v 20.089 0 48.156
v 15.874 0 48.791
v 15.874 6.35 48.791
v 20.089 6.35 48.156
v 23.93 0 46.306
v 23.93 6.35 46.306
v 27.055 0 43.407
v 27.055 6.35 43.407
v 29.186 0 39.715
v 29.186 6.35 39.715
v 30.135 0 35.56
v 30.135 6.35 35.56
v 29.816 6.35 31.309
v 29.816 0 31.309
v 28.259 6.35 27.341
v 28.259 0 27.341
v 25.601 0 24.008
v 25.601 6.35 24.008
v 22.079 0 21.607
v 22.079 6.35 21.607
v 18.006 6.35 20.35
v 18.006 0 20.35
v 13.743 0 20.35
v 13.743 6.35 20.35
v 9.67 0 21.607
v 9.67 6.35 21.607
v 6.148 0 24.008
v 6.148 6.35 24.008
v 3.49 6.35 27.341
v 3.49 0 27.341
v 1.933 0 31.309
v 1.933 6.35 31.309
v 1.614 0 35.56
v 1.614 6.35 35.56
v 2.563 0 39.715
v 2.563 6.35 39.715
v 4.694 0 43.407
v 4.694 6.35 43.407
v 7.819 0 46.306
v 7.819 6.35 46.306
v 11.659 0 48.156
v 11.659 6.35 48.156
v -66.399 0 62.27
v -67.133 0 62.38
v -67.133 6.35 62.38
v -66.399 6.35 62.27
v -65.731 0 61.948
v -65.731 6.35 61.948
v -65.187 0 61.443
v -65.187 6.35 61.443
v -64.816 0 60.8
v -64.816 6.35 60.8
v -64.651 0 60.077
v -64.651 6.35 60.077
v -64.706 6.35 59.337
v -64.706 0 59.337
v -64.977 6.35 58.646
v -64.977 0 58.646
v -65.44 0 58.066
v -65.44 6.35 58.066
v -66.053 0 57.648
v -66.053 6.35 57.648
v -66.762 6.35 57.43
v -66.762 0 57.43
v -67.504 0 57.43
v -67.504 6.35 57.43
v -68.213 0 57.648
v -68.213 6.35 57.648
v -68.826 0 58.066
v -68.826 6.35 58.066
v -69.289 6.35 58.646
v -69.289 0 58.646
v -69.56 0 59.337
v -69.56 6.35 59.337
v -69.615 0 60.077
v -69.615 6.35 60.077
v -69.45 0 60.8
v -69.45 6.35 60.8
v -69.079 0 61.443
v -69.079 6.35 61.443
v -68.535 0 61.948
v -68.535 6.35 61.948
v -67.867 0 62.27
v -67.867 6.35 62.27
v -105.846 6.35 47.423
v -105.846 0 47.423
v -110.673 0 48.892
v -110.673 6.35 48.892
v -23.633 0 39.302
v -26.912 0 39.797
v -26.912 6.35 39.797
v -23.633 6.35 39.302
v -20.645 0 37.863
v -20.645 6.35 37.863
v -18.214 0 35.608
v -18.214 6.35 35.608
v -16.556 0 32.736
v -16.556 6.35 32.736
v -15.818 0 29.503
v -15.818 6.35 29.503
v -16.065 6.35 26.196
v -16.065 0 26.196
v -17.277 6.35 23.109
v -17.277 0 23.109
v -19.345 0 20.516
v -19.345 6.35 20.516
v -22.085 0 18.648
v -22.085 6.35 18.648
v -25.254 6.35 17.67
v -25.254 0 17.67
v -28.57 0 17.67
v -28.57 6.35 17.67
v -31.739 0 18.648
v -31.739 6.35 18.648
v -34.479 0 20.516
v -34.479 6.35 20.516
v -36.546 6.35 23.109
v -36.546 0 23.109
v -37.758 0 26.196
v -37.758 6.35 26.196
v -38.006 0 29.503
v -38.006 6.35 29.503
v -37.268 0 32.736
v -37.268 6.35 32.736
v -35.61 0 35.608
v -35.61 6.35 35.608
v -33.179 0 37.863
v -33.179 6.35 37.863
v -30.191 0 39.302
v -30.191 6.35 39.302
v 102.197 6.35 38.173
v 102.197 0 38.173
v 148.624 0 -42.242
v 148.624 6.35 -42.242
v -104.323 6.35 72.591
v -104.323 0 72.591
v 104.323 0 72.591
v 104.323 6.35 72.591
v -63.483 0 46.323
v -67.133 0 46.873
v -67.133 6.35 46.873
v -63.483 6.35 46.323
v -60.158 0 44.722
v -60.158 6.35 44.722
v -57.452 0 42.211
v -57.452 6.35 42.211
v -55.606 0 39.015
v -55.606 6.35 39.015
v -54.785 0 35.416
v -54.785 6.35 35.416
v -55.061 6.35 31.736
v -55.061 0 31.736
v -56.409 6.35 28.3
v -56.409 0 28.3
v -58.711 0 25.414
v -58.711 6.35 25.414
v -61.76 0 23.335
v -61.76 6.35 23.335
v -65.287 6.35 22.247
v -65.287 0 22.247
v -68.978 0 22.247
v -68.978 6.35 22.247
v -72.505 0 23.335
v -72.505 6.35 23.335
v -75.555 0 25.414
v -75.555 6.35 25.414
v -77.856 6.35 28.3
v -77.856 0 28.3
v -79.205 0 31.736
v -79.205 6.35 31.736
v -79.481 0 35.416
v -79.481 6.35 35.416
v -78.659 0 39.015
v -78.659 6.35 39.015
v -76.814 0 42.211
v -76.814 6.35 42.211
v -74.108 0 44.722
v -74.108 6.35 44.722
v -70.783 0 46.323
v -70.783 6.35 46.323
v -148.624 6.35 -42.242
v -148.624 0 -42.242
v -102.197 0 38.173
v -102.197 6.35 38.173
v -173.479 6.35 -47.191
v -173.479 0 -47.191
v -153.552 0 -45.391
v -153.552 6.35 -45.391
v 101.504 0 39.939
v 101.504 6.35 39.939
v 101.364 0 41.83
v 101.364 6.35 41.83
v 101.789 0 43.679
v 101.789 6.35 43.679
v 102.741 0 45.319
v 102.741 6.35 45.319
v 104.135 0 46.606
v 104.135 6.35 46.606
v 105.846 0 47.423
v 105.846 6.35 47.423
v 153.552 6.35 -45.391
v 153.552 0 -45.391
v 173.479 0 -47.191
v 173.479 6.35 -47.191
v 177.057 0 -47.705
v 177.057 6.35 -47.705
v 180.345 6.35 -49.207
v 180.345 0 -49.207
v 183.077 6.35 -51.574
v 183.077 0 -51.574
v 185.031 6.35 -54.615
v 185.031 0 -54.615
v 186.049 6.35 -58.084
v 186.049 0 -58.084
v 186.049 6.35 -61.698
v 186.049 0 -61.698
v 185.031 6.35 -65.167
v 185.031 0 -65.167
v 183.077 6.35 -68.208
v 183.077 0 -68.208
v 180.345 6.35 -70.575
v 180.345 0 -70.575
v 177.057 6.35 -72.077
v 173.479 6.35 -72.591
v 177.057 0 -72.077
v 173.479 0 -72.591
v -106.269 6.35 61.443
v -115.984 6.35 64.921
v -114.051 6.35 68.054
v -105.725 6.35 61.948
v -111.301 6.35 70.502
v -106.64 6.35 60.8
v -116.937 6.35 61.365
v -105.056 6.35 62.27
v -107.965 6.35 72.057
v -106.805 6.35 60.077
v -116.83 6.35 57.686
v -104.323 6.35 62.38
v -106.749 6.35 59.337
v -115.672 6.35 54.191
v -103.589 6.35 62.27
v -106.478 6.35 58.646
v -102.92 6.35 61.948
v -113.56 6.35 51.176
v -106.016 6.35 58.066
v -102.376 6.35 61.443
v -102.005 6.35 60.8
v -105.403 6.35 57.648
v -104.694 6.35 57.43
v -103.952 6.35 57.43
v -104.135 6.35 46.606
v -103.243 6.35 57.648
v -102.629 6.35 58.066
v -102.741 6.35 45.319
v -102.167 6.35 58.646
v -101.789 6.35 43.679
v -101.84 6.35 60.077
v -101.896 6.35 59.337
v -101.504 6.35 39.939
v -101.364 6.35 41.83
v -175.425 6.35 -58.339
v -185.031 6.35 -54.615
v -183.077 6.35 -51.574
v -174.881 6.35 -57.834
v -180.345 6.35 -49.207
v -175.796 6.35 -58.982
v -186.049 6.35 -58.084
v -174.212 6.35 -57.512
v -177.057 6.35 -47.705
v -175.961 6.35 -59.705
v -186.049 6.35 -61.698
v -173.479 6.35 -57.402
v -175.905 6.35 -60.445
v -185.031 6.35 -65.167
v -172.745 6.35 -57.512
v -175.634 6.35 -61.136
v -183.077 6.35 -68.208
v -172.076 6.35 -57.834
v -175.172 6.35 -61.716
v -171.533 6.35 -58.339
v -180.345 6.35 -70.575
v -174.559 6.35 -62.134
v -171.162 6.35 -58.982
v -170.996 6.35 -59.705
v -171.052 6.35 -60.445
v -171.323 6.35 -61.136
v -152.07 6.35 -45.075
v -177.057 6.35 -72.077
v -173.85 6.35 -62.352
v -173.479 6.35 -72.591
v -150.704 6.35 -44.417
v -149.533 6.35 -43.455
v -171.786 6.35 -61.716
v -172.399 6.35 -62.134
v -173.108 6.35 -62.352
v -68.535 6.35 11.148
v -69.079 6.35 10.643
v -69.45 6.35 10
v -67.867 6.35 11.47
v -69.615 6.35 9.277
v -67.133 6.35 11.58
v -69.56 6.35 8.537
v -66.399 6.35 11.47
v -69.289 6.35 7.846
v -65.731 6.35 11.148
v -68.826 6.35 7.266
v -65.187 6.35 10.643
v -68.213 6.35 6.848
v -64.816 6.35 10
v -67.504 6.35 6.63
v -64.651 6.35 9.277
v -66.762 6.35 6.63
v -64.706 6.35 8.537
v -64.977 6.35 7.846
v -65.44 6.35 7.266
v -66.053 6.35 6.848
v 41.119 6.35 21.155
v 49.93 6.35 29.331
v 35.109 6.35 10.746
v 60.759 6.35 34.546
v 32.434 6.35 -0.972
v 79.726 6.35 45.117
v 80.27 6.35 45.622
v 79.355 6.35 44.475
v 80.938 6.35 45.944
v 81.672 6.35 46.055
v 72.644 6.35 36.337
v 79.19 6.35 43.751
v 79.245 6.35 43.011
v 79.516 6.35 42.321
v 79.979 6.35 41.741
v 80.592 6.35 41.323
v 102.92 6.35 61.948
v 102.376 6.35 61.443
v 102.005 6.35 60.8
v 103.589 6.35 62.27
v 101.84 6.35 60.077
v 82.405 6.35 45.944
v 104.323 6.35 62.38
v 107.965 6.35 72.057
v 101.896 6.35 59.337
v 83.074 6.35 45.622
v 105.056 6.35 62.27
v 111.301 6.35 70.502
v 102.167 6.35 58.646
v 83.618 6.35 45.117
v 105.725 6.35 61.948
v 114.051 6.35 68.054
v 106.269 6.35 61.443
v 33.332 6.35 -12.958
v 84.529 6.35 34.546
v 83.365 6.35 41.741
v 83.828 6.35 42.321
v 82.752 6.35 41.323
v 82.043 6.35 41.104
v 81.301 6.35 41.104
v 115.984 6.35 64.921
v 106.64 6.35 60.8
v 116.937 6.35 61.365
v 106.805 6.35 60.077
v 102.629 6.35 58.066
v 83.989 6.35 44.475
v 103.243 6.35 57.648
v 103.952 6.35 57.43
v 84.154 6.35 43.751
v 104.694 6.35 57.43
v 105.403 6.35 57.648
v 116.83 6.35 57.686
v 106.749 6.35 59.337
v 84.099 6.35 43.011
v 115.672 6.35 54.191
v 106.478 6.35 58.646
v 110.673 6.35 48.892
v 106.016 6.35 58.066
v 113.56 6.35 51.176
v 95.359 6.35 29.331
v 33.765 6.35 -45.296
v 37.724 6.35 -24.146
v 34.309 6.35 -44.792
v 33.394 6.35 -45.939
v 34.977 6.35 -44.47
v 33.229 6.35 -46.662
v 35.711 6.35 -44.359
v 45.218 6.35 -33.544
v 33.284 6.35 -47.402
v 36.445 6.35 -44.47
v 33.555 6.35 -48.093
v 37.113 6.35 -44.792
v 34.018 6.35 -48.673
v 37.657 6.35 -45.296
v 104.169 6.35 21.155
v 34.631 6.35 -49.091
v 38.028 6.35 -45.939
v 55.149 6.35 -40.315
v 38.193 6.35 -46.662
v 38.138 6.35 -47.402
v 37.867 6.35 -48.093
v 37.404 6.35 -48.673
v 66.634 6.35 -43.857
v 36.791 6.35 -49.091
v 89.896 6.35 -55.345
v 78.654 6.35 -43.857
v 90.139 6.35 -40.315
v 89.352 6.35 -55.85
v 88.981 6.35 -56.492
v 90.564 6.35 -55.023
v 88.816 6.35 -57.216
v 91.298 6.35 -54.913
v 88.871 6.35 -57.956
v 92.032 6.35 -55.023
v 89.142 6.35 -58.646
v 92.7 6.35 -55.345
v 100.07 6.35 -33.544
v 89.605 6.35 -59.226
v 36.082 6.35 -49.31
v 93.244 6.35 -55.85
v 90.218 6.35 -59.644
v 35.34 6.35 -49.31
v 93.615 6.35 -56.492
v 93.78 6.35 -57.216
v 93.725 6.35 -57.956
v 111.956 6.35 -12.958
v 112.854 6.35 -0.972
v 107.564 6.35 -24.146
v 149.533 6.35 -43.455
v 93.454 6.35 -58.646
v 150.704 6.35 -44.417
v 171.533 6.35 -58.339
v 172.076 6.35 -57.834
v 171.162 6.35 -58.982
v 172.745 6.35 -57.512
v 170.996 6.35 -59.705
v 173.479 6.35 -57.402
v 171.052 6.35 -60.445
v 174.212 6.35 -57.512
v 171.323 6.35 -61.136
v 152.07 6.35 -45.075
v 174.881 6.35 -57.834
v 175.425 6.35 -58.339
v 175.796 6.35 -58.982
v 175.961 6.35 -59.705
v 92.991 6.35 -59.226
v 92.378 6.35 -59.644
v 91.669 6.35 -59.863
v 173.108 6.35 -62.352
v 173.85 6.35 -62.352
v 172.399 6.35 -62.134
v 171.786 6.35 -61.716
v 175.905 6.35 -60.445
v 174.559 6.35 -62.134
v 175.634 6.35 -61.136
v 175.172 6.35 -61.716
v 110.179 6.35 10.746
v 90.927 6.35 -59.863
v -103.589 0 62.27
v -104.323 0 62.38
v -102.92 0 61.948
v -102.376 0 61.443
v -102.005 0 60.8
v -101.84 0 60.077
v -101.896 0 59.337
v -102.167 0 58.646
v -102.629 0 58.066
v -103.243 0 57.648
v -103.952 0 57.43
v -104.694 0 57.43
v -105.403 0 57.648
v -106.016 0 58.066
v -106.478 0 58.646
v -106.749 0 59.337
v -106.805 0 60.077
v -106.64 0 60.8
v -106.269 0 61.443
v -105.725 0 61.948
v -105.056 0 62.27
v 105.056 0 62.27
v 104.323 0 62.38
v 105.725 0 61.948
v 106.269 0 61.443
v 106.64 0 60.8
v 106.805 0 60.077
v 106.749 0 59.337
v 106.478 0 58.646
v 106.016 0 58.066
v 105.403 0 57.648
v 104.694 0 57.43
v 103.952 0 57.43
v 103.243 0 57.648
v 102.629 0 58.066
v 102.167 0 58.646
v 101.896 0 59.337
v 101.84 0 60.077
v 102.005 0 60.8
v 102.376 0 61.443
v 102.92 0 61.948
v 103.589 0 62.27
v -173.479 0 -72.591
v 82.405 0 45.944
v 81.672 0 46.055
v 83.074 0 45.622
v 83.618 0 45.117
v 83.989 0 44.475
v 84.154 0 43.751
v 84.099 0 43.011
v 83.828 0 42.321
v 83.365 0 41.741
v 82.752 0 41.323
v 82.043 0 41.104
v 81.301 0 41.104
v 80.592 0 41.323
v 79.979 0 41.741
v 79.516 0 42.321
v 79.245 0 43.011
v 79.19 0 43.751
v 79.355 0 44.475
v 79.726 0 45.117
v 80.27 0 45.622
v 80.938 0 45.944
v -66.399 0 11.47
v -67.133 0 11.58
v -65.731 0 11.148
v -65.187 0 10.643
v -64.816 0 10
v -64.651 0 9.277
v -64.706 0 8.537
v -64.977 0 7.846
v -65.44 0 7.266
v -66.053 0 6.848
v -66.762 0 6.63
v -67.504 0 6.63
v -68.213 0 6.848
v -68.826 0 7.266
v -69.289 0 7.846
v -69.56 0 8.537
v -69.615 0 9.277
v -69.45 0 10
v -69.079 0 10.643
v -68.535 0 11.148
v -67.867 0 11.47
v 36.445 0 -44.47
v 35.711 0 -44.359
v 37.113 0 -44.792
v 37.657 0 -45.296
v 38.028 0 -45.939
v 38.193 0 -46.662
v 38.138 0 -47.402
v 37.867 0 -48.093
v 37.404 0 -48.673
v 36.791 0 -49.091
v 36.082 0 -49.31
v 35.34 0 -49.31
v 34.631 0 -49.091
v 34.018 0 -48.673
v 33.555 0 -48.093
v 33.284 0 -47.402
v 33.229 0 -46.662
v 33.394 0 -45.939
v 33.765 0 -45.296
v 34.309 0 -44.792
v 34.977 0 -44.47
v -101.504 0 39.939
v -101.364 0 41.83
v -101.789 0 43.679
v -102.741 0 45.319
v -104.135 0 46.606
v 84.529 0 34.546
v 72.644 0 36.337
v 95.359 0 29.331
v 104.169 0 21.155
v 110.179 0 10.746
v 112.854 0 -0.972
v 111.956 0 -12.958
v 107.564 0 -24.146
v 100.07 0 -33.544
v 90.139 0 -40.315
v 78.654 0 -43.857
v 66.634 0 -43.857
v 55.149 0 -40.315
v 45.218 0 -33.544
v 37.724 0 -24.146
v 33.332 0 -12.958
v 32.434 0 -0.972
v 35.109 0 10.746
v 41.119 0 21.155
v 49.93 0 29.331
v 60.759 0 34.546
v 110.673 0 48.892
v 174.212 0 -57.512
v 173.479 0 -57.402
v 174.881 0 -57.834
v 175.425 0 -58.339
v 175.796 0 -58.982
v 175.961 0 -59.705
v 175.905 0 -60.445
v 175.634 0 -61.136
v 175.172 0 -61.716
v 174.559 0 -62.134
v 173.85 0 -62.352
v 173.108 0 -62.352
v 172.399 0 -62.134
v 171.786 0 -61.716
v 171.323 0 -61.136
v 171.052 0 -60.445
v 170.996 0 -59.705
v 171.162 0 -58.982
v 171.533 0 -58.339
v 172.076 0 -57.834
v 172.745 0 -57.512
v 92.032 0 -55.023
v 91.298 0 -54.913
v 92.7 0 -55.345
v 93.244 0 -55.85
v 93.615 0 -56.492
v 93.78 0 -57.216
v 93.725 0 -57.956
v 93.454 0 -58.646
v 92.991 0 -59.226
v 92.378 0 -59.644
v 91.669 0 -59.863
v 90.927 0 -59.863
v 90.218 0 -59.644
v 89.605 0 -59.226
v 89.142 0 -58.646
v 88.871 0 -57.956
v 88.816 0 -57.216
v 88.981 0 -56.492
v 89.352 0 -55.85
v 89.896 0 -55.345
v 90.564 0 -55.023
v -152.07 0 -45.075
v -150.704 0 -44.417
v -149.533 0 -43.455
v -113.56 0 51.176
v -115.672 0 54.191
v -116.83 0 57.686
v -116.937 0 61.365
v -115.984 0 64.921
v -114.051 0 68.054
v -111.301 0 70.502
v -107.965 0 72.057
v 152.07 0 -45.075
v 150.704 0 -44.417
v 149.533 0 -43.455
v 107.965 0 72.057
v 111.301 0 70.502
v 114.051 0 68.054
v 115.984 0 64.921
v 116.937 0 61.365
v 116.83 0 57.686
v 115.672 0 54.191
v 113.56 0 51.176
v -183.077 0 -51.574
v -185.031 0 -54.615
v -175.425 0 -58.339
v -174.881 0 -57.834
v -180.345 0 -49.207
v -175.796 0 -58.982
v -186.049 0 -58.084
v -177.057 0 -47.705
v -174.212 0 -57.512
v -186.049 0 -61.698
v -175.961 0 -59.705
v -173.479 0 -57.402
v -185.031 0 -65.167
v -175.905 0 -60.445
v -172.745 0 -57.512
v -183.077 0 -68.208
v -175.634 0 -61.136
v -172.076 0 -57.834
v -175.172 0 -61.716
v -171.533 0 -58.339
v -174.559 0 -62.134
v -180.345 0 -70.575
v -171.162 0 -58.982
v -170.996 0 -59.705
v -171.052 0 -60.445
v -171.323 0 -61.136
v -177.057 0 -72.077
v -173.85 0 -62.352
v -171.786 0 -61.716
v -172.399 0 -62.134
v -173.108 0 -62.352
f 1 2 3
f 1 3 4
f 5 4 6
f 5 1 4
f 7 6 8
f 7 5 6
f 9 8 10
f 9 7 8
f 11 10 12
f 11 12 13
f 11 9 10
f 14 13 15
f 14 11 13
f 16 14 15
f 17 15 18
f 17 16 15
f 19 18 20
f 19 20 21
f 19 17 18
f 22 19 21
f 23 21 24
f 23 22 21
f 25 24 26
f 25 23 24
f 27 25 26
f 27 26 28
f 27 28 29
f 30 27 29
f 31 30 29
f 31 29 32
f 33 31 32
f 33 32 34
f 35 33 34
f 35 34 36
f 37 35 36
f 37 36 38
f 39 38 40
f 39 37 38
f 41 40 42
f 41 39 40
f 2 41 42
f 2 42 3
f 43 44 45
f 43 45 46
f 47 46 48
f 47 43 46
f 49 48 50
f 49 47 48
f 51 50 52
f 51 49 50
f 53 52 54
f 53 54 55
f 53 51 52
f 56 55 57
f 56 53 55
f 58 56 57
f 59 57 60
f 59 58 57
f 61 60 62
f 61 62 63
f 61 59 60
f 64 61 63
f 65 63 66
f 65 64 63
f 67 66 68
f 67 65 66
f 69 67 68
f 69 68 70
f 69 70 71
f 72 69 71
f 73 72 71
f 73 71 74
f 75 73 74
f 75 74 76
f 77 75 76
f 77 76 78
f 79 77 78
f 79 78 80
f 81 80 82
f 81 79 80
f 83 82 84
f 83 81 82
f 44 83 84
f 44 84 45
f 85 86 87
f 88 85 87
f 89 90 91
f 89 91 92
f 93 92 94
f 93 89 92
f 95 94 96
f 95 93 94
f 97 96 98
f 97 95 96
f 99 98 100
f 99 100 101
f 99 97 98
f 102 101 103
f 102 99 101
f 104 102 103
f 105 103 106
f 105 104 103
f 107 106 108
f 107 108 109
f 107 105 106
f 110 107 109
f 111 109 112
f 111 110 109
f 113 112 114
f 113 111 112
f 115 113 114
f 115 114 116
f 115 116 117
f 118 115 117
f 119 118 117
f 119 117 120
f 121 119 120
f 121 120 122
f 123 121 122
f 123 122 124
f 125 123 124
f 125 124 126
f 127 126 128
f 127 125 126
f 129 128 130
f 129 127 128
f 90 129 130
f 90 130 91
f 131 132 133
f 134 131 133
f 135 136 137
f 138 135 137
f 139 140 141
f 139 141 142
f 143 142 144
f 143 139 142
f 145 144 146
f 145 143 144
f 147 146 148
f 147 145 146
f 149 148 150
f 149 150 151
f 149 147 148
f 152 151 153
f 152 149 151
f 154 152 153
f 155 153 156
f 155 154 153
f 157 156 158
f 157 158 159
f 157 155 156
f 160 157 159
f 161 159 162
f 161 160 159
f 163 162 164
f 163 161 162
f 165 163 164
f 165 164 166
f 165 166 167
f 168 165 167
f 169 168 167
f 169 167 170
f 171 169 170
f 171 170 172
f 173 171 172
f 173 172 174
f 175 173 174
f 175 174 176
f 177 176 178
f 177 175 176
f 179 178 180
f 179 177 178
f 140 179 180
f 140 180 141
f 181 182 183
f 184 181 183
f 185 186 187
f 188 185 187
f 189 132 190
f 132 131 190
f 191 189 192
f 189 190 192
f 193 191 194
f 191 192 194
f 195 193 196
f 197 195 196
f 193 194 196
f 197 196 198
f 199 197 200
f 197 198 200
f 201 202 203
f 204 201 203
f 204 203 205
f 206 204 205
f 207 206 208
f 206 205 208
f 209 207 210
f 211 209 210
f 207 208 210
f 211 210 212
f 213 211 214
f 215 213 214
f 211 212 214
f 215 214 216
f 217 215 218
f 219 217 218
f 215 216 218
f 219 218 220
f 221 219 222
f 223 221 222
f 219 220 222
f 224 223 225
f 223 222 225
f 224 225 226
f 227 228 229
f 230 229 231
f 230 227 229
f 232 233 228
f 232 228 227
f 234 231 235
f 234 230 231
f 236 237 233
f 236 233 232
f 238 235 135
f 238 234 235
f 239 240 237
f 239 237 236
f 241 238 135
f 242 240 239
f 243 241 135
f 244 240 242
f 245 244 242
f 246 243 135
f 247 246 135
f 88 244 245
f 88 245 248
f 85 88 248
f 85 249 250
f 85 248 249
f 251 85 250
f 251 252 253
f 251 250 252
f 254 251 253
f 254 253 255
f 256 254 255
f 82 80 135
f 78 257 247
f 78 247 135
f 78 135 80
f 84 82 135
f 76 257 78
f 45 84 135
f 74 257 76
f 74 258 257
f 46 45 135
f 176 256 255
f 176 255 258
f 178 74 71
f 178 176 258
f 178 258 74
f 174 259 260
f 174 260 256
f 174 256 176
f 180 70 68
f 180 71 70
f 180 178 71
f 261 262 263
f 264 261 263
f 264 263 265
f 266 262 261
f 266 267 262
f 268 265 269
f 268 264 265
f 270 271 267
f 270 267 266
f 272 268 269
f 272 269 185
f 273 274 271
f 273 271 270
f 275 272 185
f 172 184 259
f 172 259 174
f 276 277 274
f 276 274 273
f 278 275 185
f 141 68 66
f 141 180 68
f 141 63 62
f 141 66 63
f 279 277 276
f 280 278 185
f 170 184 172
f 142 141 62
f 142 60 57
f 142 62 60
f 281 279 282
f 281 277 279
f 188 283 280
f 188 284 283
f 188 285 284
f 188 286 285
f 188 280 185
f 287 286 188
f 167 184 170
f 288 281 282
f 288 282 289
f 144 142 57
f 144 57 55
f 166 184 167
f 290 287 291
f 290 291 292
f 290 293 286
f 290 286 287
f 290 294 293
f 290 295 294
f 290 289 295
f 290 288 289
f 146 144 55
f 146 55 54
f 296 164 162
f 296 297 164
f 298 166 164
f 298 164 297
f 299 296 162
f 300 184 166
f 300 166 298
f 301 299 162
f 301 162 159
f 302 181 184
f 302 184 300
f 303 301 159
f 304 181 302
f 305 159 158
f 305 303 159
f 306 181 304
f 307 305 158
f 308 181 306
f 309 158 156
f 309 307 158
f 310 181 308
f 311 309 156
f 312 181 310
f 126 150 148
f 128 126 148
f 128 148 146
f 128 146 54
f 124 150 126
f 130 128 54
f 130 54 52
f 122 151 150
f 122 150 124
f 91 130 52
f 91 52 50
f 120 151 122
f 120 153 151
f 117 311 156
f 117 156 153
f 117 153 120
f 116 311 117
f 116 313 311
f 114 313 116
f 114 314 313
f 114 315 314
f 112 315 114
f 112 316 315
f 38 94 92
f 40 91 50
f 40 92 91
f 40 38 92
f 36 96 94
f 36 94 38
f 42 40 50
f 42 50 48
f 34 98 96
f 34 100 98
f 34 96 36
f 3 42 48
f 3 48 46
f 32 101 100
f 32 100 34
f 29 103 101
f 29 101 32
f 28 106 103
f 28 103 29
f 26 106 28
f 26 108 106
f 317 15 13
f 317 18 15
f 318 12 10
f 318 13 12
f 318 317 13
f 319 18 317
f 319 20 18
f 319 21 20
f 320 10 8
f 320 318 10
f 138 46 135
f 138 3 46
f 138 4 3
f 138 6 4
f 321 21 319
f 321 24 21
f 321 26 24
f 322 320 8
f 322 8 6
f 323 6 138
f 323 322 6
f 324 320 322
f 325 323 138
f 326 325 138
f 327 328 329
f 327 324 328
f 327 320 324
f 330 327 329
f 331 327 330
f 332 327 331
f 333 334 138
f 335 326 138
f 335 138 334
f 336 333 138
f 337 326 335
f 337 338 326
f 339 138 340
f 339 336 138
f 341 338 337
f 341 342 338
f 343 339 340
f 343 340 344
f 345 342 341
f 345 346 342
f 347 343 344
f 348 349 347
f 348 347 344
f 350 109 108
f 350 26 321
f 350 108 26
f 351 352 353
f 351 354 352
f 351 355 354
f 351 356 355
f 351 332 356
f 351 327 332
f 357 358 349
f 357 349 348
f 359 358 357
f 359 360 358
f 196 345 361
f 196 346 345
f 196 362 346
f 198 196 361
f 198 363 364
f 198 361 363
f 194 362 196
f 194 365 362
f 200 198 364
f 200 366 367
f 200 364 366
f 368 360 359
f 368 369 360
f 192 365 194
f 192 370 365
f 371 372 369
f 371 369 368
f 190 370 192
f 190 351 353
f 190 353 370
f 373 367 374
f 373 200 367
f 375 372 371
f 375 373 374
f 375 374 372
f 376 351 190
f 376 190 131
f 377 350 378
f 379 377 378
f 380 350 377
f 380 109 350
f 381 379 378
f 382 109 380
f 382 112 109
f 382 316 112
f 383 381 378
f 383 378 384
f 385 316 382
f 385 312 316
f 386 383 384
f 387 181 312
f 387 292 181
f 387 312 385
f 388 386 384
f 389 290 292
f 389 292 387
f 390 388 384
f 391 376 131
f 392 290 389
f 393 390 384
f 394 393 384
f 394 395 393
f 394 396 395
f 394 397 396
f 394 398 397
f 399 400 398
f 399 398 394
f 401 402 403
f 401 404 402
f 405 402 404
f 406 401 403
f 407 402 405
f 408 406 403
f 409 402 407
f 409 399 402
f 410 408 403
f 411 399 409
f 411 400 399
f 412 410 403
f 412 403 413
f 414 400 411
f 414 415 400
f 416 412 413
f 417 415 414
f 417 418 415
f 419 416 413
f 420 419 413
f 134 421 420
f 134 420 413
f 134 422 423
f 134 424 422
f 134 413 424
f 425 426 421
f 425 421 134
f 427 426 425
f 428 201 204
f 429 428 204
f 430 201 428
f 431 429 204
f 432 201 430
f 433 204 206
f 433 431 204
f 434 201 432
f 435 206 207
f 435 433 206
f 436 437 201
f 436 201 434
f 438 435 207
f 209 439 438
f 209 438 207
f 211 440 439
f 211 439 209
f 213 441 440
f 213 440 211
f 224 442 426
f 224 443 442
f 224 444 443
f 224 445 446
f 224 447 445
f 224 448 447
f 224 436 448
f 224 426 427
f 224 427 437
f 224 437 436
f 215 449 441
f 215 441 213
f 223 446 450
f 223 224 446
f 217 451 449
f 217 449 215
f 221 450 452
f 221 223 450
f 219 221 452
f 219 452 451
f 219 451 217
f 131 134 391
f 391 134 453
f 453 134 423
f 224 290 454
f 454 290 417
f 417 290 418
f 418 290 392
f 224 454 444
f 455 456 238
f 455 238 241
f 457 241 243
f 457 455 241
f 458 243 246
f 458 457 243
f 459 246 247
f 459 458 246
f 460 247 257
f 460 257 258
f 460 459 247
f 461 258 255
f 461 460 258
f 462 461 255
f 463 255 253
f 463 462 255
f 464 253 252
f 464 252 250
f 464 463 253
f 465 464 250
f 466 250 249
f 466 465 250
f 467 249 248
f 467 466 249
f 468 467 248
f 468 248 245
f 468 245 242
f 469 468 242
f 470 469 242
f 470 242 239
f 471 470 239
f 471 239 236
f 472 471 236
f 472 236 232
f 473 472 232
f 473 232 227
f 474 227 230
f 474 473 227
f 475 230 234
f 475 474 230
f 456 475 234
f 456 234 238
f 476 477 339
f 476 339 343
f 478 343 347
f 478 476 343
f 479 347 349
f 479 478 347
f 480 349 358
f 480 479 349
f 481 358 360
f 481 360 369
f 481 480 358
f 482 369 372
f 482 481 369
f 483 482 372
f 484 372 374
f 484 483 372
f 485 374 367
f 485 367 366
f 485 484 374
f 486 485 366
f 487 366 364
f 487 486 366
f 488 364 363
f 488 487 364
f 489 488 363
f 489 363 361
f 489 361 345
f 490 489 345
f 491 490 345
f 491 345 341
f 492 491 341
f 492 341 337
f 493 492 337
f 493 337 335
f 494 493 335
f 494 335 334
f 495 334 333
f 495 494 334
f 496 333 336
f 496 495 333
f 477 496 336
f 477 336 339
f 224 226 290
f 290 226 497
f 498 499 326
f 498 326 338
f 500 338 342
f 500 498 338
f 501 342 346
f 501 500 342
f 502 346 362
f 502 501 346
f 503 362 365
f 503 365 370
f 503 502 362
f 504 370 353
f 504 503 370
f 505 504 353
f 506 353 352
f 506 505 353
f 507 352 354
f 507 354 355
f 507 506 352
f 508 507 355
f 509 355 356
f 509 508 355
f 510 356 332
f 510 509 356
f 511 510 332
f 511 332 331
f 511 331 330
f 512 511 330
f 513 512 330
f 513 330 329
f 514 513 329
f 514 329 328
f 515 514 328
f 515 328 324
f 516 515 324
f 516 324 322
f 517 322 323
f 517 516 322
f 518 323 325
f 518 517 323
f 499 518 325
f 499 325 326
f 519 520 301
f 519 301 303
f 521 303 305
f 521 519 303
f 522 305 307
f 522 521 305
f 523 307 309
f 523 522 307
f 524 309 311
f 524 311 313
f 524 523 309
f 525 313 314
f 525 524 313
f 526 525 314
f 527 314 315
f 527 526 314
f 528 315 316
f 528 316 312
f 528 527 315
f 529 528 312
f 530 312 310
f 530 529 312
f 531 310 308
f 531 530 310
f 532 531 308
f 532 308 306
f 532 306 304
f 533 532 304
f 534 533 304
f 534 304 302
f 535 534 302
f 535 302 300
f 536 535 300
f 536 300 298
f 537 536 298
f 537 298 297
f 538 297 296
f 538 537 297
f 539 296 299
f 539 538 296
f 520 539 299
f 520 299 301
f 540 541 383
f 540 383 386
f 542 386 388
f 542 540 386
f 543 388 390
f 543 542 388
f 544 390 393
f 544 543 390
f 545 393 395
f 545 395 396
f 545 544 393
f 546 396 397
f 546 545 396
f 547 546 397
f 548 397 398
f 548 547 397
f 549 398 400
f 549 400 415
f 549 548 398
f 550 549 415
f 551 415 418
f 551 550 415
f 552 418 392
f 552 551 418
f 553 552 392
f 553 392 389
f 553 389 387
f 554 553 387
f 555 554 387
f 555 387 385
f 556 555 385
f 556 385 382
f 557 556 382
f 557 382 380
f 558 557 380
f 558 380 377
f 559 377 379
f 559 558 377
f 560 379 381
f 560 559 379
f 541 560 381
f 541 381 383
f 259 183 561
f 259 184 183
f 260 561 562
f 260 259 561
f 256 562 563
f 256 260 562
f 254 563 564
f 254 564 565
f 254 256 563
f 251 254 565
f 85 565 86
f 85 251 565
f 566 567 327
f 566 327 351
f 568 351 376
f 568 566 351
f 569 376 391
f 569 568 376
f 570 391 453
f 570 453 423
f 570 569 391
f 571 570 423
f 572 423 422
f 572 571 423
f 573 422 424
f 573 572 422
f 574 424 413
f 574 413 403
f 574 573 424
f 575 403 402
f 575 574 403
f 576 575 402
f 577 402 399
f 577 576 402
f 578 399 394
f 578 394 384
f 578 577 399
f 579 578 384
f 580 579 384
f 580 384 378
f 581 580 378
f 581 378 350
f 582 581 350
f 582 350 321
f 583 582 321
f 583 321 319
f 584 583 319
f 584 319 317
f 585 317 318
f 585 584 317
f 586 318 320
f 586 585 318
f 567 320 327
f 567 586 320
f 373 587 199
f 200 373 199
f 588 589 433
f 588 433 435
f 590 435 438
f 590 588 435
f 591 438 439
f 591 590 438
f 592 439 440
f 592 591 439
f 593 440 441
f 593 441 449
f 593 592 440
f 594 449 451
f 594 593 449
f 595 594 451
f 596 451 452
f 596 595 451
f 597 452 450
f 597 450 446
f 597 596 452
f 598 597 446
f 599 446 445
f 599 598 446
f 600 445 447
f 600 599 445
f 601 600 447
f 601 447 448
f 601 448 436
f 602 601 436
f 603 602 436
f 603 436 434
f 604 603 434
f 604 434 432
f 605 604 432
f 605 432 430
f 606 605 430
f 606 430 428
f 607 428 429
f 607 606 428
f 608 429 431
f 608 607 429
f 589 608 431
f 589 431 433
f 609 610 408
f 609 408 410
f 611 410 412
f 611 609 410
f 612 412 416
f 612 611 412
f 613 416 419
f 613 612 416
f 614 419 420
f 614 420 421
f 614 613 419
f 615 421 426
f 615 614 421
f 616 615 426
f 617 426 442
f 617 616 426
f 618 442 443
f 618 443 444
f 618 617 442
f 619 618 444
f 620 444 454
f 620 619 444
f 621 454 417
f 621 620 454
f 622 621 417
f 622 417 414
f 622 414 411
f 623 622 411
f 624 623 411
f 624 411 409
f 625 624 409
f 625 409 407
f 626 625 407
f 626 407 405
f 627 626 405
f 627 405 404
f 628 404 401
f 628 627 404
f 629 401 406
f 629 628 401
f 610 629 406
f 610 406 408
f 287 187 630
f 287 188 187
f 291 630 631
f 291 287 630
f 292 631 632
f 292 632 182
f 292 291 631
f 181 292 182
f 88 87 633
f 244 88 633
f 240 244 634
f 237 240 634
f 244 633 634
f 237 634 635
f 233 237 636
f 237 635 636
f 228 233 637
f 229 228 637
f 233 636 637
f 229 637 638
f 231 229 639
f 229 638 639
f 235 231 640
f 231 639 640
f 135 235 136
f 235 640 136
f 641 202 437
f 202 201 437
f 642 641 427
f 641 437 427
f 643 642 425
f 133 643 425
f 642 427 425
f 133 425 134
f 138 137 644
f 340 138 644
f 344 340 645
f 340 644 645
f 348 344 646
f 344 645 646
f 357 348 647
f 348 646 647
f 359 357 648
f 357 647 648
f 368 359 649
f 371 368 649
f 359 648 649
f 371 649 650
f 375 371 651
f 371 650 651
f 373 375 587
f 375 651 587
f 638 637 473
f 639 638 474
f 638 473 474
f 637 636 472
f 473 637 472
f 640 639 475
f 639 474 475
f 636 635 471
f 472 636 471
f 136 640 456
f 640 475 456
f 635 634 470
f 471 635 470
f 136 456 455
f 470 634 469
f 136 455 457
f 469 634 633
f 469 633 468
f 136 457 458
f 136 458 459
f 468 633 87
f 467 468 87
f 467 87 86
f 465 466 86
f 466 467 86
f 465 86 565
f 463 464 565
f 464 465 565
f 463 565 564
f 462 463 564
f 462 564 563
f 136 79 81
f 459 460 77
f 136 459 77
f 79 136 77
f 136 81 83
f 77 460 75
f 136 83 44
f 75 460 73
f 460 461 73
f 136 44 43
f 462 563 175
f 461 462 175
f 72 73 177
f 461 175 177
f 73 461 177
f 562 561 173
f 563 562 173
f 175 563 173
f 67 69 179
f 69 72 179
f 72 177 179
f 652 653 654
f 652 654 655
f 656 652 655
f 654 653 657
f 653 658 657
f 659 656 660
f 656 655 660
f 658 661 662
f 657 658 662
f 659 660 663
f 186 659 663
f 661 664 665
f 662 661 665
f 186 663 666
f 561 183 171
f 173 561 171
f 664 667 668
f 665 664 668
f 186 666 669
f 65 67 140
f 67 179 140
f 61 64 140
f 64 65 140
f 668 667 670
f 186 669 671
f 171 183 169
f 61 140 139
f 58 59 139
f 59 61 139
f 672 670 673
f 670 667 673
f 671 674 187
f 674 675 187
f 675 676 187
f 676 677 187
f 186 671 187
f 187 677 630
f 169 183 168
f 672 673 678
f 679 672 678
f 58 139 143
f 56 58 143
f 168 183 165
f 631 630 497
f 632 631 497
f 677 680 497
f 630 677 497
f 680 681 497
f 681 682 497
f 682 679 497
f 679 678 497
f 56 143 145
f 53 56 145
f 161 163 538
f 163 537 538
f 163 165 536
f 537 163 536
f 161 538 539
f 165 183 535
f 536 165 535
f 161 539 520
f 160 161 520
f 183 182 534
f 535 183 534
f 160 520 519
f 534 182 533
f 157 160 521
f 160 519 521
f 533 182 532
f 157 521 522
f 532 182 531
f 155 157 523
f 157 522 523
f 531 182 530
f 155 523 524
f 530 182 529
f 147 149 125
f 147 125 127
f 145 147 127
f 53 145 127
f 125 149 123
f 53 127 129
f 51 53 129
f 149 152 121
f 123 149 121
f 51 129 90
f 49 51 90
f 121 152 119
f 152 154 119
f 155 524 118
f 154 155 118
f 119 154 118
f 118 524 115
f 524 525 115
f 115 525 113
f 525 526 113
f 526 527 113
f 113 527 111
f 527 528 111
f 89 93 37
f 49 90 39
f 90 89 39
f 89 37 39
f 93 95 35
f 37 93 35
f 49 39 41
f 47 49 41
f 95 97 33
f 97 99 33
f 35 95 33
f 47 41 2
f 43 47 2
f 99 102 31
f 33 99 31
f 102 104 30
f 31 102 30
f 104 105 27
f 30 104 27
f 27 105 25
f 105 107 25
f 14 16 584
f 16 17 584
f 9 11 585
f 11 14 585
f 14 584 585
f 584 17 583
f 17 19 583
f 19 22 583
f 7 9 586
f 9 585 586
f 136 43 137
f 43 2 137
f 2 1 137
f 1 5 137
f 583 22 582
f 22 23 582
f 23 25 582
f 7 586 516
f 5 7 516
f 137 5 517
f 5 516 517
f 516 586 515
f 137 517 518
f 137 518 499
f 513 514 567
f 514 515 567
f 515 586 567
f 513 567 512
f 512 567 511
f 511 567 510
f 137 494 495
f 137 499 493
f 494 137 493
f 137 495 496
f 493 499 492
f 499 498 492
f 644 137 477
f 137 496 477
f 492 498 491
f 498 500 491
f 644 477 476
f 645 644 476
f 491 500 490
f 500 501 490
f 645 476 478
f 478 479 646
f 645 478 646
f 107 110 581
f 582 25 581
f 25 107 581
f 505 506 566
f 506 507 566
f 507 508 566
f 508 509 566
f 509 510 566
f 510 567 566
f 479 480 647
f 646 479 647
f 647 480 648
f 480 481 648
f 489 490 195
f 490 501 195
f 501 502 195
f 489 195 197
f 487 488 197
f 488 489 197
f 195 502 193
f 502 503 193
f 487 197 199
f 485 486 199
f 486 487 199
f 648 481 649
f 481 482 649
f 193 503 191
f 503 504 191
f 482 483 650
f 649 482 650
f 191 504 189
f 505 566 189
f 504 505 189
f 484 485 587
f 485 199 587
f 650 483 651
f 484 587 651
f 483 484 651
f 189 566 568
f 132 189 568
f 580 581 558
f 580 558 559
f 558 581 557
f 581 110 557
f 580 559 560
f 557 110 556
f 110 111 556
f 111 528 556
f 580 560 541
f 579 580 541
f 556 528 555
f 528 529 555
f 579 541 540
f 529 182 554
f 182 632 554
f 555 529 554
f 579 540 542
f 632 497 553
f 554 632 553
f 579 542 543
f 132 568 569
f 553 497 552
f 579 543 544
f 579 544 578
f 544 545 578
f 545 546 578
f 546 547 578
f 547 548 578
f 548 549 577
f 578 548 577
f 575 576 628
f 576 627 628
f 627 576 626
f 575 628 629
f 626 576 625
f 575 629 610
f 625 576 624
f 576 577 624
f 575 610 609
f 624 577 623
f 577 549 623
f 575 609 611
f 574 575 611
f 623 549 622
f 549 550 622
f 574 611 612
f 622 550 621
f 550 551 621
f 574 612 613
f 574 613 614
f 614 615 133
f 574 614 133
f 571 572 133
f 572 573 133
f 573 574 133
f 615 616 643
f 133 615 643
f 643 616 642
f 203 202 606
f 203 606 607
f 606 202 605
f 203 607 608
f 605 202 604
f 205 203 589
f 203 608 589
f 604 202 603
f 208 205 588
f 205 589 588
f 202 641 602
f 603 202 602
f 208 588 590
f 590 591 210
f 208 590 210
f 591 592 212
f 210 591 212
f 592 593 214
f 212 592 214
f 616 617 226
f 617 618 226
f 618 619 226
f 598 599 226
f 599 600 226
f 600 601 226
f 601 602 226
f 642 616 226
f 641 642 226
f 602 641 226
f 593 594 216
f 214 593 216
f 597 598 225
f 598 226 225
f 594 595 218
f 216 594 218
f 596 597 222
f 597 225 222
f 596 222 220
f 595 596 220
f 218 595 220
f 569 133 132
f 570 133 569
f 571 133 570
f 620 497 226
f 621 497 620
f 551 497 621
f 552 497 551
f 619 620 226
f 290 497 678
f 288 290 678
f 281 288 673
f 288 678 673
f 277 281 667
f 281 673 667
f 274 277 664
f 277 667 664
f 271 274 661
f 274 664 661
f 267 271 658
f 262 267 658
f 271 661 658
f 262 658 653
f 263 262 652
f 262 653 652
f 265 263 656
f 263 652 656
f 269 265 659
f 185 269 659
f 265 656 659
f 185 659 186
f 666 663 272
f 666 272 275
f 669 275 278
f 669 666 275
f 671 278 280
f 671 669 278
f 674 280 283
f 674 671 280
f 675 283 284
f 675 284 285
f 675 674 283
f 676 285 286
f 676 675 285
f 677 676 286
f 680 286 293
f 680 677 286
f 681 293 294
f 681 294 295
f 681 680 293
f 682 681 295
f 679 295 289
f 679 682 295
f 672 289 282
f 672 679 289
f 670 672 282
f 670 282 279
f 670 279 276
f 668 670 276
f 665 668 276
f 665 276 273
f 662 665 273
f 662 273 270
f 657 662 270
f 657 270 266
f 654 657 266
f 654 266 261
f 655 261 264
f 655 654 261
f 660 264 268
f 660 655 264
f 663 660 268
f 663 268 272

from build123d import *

# Parameters (mm, degrees)
SKETCH1_R           = 2.4892
SKETCH1_R_2         = 12.3825
SKETCH1_R_3         = 14.3002
SKETCH1_R_4         = 11.1252
SKETCH1_R_5         = 40.3225
BOSS_EXTRUDE1_DEPTH = 6.35
FILLET2_R           = 6.35


with BuildPart() as part:
    # Sketch1 → Boss-Extrude1 (new body)
    with BuildSketch(Plane(origin=(0, 0, 0), x_dir=(1, 0, 0), z_dir=(0, 1, 0))):
        with BuildLine():
            ThreePointArc((-173.478687828, 72.590962089), (-186.178687828, 59.890962089), (-173.478687828, 47.190962089))
            Line((-173.478687828, 47.190962089), (-150.271339409, 45.094655518))
            Line((-150.271339409, 45.094655518), (-98.200516404, -45.094655518))
            Line((-98.200516404, -45.094655518), (-110.67256166, -48.892439461))
            ThreePointArc((-110.67256166, -48.892439461), (-116.589819654, -63.177963961), (-104.32256166, -72.590962089))
            Line((-104.32256166, -72.590962089), (104.322561739, -72.590962089))
            ThreePointArc((104.322561739, -72.590962089), (116.589819664, -63.177963923), (110.67256166, -48.892439461))
            Line((110.67256166, -48.892439461), (98.200516404, -45.094655518))
            Line((98.200516404, -45.094655518), (150.271339409, 45.094655518))
            Line((150.271339409, 45.094655518), (173.478687828, 47.190962089))
            ThreePointArc((173.478687828, 47.190962089), (186.178687828, 59.890962094), (173.478687816, 72.590962089))
            Line((173.478687816, 72.590962089), (-173.478687828, 72.590962089))
        make_face()
        with Locations(Location((173.478687828, 59.890962089, 0), (0, 0, 270))):
            Circle(SKETCH1_R, mode=Mode.SUBTRACT)
        with Locations(Location((-104.32256166, -59.890962089, 0), (0, 0, 270))):
            Circle(SKETCH1_R, mode=Mode.SUBTRACT)
        with Locations(Location((-67.13289048, -59.890962089, 0), (0, 0, 270))):
            Circle(SKETCH1_R, mode=Mode.SUBTRACT)
        with Locations(Location((-67.13289048, -34.490962089, 0), (0, 0, 270))):
            Circle(SKETCH1_R_2, mode=Mode.SUBTRACT)
        with Locations(Location((-67.13289048, -9.090962089, 0), (0, 0, 270))):
            Circle(SKETCH1_R, mode=Mode.SUBTRACT)
        with Locations(Location((15.87430952, -34.490962089, 0), (0, 0, 270))):
            Circle(SKETCH1_R_3, mode=Mode.SUBTRACT)
        with Locations(Location((81.671791392, -43.565397329, 0), (0, 0, 270))):
            Circle(SKETCH1_R, mode=Mode.SUBTRACT)
        with Locations(Location((-26.911726221, -28.671379147, 0), (0, 0, 270))):
            Circle(SKETCH1_R_4, mode=Mode.SUBTRACT)
        with Locations(Location((-173.478687828, 59.890962089, 0), (0, 0, 270))):
            Circle(SKETCH1_R, mode=Mode.SUBTRACT)
        with Locations(Location((72.644027153, 3.985206637, 0), (0, 0, 270))):
            Circle(SKETCH1_R_5, mode=Mode.SUBTRACT)
        with Locations(Location((35.710881273, 46.848232392, 0), (0, 0, 270))):
            Circle(SKETCH1_R, mode=Mode.SUBTRACT)
        with Locations(Location((91.297923401, 57.401762089, 0), (0, 0, 270))):
            Circle(SKETCH1_R, mode=Mode.SUBTRACT)
        with Locations(Location((104.32256166, -59.890962089, 0), (0, 0, 270))):
            Circle(SKETCH1_R, mode=Mode.SUBTRACT)
    extrude(amount=BOSS_EXTRUDE1_DEPTH)

    # Fillet2
    fillet2_edges = [part.edges().sort_by_distance(p)[0] for p in [
        (150.271339409, 3.175, -45.094655518),
        (98.200516404, 3.175, 45.094655518),
        (-98.200516404, 3.175, 45.094655518),
        (-150.271339409, 3.175, -45.094655518),
    ]]
    fillet(fillet2_edges, radius=FILLET2_R)


solid = part.part
